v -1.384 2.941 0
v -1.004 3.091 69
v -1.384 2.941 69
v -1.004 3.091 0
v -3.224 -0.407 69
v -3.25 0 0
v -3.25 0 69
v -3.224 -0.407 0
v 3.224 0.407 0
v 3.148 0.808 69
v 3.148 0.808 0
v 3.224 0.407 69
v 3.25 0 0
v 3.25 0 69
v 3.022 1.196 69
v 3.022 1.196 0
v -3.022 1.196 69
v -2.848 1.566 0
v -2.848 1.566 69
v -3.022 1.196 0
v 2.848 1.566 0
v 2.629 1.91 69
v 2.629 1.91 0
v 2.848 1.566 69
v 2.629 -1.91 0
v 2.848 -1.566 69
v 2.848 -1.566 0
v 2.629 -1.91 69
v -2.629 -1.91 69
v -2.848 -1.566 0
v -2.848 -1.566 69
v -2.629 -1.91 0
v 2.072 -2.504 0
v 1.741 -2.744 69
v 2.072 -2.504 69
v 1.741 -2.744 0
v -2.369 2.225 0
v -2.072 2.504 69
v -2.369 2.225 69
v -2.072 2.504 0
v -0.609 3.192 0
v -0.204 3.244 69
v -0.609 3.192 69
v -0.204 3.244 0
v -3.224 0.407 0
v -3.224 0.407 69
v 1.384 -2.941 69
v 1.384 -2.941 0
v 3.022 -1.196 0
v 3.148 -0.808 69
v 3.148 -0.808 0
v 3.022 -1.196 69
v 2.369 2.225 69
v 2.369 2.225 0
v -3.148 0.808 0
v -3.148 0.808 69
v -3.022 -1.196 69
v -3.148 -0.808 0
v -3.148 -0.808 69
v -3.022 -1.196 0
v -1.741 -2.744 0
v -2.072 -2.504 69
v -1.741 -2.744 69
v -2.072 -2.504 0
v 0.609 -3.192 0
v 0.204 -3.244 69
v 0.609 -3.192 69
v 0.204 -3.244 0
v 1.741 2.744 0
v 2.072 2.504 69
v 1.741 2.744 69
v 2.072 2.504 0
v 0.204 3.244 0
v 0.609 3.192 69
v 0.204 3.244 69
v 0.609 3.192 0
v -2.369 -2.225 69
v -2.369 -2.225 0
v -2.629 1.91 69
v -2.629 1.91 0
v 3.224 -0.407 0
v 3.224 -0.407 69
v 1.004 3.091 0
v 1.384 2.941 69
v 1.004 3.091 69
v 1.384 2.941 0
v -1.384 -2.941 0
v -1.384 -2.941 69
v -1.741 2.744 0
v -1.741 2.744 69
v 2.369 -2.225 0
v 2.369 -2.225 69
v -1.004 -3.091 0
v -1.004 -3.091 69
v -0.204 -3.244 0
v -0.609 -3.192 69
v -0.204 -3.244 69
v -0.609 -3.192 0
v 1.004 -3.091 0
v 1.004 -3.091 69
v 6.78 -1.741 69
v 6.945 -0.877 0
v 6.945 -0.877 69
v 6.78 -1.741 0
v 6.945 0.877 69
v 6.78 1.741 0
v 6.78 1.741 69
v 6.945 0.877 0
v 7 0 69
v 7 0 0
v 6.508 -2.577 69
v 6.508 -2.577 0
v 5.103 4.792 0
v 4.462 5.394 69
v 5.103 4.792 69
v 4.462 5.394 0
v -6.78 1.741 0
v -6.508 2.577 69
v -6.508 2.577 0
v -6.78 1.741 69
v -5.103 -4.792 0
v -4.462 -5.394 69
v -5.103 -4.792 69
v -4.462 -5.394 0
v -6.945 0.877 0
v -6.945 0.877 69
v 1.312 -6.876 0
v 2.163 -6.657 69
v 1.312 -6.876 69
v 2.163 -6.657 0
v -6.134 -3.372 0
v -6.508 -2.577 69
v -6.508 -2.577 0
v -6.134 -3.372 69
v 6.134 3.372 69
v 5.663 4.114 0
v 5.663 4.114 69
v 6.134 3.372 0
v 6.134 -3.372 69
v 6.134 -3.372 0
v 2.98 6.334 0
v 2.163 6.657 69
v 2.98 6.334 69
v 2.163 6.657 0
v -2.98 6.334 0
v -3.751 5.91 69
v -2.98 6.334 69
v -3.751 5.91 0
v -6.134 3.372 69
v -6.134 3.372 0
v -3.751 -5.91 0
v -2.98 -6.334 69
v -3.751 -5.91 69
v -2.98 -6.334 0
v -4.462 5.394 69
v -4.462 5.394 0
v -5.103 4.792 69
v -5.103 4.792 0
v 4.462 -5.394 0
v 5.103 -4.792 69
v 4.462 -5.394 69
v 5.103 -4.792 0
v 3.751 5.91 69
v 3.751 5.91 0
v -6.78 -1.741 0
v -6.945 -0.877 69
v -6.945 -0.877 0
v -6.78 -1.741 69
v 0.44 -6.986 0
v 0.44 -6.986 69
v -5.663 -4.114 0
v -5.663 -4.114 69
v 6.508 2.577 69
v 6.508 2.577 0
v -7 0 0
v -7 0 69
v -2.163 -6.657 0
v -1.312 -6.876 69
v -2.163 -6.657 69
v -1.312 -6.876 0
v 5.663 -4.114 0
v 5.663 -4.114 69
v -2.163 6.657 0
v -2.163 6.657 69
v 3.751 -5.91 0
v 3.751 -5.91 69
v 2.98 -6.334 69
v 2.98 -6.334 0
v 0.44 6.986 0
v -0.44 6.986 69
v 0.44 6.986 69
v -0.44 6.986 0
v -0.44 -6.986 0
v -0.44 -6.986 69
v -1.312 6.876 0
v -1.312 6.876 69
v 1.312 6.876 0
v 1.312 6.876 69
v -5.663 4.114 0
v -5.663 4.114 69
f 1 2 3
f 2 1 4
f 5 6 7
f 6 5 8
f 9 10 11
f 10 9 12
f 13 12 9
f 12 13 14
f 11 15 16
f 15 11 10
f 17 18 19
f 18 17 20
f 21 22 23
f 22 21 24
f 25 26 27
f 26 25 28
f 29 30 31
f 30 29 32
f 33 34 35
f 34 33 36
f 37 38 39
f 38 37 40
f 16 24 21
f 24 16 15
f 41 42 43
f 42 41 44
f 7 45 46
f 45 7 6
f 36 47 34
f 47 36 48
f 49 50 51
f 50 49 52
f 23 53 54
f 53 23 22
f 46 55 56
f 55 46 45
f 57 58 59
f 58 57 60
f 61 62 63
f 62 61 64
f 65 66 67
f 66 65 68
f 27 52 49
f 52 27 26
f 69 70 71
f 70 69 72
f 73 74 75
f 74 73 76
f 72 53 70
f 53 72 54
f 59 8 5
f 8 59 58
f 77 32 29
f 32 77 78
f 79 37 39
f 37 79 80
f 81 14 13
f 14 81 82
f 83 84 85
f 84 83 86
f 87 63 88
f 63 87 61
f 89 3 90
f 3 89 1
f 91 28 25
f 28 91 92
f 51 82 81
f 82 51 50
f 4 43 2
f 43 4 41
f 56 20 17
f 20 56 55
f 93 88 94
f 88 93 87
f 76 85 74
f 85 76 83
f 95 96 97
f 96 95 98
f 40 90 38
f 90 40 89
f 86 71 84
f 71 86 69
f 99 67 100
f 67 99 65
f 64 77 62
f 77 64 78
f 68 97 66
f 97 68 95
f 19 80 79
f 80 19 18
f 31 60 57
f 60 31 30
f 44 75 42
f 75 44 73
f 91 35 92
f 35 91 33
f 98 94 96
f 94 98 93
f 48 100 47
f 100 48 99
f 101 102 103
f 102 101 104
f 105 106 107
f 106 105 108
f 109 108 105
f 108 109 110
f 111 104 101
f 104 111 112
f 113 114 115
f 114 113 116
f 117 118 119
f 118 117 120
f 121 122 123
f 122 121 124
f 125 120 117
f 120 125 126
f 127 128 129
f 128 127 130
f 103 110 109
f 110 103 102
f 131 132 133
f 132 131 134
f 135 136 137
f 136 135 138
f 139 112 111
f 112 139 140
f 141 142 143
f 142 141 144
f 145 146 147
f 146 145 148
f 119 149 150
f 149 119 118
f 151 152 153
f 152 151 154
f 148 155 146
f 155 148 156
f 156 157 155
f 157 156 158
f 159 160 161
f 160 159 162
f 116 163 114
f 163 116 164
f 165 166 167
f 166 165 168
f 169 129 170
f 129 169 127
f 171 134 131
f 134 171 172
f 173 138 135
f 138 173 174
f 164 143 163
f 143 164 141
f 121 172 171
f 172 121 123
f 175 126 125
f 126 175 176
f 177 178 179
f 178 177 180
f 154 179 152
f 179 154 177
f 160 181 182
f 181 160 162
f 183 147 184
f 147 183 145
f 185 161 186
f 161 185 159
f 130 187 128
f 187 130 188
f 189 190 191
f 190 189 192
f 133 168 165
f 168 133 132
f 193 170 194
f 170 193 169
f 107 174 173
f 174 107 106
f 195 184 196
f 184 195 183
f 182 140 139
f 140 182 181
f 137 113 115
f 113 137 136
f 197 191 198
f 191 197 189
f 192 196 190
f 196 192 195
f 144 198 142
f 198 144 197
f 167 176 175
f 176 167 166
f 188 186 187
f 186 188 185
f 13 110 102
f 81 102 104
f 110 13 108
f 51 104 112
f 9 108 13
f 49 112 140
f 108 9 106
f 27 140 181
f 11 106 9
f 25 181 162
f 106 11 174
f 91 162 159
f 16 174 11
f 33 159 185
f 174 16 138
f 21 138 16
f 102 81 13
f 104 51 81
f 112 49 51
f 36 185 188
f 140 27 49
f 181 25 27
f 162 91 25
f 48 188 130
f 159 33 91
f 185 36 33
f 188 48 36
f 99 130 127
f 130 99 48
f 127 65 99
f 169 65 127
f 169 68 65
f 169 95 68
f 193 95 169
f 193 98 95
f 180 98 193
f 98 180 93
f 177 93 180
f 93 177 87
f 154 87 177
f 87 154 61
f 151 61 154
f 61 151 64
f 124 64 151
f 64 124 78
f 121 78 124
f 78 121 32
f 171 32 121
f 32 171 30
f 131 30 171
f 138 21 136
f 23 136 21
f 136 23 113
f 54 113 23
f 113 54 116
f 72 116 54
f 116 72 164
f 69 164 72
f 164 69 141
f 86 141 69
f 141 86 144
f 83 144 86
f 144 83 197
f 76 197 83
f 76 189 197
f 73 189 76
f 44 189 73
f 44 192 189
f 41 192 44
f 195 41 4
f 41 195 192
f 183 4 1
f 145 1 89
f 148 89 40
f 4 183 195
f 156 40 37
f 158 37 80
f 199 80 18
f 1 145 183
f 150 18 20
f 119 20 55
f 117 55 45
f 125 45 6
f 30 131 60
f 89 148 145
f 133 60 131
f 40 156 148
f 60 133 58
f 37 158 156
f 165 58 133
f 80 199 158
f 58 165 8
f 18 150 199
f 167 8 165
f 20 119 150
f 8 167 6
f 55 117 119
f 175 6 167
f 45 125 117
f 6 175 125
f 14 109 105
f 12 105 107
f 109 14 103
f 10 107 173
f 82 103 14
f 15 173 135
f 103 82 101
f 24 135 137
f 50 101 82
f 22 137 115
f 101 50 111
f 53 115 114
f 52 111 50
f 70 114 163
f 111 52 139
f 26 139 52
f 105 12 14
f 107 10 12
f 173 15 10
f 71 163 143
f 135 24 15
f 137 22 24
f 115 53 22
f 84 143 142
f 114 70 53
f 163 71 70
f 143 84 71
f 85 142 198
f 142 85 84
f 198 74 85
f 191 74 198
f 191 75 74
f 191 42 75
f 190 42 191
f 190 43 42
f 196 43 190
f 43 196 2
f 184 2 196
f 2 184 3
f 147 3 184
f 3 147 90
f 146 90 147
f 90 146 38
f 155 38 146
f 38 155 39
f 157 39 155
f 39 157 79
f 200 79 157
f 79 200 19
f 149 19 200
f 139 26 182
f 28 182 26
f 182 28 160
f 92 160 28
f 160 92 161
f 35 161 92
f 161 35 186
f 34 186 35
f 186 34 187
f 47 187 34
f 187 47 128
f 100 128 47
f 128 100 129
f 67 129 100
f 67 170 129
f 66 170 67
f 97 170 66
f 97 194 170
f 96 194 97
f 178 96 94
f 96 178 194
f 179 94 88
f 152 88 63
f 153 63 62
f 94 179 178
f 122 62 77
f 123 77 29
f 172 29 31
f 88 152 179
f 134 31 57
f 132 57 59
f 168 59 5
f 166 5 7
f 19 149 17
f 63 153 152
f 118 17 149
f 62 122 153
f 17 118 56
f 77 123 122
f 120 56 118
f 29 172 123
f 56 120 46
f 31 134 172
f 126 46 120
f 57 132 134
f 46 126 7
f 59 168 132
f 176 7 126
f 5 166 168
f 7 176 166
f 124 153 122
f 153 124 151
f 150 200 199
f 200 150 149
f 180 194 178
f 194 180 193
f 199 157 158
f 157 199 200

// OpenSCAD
$fn = 50;


difference() {
	union() {
		*color(alpha = 1.0000000000, c = "gray") {
			translate(v = [0, 7, 0]) {
				linear_extrude(height = 1) {
					text(font = "Arial:style=Bold", halign = "center", size = 4.5000000000, text = "COMMENT plate main", valign = "center");
				}
			}
		}
		cylinder(h = 69, r = 7.0000000000);
	}
	union() {
		*color(alpha = 1.0000000000, c = "gray") {
			translate(v = [0, 7, 0]) {
				linear_extrude(height = 1) {
					text(font = "Arial:style=Bold", halign = "center", size = 4.5000000000, text = "COMMENT holes main", valign = "center");
				}
			}
		}
		translate(v = [0, 0, -100]) {
			cylinder(h = 200, r = 3.2500000000);
		}
		translate(v = [0, 0, -100]) {
			cylinder(h = 200, r = 1.8000000000);
		}
	}
}
